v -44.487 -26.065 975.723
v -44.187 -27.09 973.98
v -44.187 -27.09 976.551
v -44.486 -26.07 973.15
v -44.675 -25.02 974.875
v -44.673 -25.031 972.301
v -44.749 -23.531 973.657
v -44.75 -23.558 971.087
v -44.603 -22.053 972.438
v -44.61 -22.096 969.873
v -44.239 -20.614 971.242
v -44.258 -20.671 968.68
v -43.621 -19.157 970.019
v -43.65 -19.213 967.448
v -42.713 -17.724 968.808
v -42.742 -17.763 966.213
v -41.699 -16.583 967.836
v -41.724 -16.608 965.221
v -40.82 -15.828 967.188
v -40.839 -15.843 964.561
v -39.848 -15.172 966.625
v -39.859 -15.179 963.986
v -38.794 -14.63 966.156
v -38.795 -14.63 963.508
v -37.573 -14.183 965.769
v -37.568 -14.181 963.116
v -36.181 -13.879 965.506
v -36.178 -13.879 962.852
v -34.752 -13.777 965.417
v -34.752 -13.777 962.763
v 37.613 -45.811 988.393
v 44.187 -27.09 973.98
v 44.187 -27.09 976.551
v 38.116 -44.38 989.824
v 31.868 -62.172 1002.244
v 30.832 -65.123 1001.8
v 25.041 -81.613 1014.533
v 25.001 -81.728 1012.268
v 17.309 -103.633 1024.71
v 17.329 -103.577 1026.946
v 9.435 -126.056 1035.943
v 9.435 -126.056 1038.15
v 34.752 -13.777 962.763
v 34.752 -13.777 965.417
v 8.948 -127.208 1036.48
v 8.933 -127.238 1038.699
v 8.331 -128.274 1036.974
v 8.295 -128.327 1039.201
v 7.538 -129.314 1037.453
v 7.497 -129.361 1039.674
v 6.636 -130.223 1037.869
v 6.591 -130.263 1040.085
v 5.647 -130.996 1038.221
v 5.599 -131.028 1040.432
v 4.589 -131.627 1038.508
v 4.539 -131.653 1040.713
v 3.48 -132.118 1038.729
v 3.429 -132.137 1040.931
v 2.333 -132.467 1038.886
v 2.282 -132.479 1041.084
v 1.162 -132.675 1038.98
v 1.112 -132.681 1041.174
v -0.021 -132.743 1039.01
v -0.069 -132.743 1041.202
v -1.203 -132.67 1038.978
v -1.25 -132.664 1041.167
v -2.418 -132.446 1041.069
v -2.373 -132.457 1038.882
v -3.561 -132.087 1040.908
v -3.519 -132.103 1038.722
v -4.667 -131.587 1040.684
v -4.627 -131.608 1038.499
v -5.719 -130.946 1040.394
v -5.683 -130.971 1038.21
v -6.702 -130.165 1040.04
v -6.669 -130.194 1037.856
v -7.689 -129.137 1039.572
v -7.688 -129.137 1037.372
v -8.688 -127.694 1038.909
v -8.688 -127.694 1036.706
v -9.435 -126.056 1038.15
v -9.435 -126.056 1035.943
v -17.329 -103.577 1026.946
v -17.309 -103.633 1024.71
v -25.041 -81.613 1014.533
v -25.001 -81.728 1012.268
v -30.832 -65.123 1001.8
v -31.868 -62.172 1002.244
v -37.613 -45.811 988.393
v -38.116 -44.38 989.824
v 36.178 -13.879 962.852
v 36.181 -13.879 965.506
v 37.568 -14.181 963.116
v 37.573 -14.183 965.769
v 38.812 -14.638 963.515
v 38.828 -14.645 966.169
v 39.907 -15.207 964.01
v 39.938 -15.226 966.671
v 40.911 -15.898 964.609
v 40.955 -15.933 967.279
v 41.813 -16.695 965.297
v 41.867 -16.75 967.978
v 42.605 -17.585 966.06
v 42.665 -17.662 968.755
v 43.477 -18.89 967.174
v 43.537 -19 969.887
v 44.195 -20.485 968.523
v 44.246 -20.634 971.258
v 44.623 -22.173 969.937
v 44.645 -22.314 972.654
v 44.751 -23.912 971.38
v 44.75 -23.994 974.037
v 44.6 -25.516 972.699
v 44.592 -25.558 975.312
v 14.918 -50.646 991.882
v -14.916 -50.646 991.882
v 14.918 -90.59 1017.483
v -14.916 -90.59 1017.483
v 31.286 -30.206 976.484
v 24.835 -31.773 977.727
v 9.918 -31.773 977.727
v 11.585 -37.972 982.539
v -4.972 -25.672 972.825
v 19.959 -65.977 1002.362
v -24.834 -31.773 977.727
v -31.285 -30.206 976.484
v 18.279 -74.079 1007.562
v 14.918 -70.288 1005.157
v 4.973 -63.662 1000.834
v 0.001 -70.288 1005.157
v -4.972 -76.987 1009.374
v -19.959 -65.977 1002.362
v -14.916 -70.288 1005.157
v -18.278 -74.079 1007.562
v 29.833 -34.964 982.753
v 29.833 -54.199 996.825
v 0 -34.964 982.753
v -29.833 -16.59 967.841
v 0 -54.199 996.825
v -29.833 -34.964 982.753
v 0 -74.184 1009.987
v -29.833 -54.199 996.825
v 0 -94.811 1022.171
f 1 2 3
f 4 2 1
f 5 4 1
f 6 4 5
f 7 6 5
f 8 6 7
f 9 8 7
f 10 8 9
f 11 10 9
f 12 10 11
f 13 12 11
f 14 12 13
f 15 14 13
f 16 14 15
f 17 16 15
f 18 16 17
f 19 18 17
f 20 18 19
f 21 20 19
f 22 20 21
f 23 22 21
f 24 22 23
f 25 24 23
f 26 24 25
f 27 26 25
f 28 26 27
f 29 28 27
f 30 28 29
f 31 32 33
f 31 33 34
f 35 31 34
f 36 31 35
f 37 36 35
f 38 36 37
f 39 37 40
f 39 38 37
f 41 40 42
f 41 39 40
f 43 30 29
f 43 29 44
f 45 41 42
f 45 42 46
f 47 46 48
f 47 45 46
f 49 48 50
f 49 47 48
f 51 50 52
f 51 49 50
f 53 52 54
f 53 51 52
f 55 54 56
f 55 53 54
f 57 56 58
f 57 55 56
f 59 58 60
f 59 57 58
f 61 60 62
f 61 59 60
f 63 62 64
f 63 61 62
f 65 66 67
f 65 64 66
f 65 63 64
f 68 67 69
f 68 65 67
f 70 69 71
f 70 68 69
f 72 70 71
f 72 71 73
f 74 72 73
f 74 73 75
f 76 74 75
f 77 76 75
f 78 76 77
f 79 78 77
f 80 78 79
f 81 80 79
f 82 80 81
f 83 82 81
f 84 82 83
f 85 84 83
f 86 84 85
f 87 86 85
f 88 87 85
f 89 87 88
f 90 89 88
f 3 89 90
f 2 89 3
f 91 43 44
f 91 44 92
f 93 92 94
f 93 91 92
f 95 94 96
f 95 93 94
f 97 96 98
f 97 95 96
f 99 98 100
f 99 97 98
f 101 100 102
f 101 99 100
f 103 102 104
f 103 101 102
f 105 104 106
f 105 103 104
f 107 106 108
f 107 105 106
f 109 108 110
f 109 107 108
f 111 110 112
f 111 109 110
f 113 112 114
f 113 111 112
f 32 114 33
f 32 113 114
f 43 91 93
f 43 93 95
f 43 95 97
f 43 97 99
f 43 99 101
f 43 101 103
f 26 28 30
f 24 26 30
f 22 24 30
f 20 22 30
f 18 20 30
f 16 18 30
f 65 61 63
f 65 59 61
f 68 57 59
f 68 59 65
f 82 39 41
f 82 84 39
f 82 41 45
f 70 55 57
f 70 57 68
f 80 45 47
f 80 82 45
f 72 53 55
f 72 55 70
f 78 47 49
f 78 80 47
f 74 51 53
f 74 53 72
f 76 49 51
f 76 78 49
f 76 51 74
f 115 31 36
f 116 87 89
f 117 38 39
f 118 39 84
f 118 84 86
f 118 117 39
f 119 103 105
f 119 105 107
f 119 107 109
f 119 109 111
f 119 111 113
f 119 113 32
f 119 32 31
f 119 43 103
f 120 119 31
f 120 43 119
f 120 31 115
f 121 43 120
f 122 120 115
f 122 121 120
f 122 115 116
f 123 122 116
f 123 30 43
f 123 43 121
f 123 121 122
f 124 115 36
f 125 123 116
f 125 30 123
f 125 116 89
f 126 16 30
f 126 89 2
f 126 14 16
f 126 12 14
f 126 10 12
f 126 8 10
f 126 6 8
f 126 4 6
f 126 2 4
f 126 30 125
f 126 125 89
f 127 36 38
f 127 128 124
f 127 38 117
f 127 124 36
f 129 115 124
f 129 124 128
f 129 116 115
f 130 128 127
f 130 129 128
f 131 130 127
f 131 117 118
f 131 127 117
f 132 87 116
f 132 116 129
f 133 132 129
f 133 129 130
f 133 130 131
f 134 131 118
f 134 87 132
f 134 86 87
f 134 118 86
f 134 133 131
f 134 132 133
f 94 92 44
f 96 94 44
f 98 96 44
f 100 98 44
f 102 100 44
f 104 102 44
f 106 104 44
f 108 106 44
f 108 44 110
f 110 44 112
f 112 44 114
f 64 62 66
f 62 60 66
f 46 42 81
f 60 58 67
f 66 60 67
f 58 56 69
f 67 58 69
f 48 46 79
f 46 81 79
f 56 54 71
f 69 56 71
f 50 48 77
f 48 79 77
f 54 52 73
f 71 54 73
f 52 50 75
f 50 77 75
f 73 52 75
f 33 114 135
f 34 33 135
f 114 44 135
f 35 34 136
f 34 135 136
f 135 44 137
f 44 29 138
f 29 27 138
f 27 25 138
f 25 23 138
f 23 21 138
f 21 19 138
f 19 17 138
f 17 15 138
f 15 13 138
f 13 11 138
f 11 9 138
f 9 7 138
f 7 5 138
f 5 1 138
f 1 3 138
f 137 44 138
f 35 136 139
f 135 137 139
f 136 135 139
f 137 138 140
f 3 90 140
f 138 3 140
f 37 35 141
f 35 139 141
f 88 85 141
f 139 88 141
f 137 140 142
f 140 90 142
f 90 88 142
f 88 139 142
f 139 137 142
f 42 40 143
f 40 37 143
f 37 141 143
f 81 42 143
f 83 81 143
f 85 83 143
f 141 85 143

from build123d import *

# Parameters (mm, degrees)
BOSS_EXTRUDE1_DEPTH      = 60
BOSS_EXTRUDE1_DEPTH_BACK = 60
SKETCH2_W                = 211.885293394
SKETCH2_H                = 245.618275427
CUT_EXTRUDE1_DEPTH       = 1077.011666391


with BuildPart() as part:
    # Sketch1 → Boss-Extrude1 (new, two sides: drawn at the far end of the back side and taken through both)
    with BuildSketch(Plane(origin=(0, 0, 0), x_dir=(0, 0, -1), z_dir=(1, 0, 0)).offset(-BOSS_EXTRUDE1_DEPTH_BACK)):
        with BuildLine():
            Line((-939.728923081, 10.577778274), (-941.143184766, 11.992039959))
            add(Edge.make_bspline(
                [(-941.143184766, 11.992039959), (-944.866454136, 8.352727843), (-953.96735323, -0.88168341), (-973.200532651, -22.236280395), (-997.43063536, -53.698126084), (-1022.870084933, -94.455289348), (-1043.814229453, -136.740255628), (-1054.637723921, -165.536150075), (-1059.122238281, -179.688951706)],
                knots=[0.580973428, 0.580973428, 0.580973428, 0.580973428, 0.601711861, 0.63234941, 0.693624509, 0.754899607, 0.816174705, 0.874857615, 0.874857615, 0.874857615, 0.874857615], degree=3))
            Line((-1059.122238281, -179.688951706), (-1057.176612318, -180.169892955))
            add(Edge.make_bspline(
                [(-939.728923081, 10.577778274), (-992.215291969, -40.719110356), (-1034.812797305, -109.667140015), (-1057.176612318, -180.169892955)],
                knots=[0.580942389, 0.580942389, 0.580942389, 0.580942389, 0.874686569, 0.874686569, 0.874686569, 0.874686569], degree=3))
        make_face()
    extrude(amount=BOSS_EXTRUDE1_DEPTH + BOSS_EXTRUDE1_DEPTH_BACK)

    # Sketch2 → Cut-Extrude1 (cut, through all)
    with BuildSketch(Plane.XY):
        with Locations((18.076578956, -88.621698106)):
            Rectangle(SKETCH2_W, SKETCH2_H)
        with BuildLine():
            Line((-0.946549017, -13.77664422), (0.946549017, -13.77664422))
            Line((0.946549017, -13.77664422), (34.752164535, -13.77664422))
            ThreePointArc((34.752164535, -13.77664422), (42.910959356, -17.994424311), (44.187353703, -27.089830806))
            Line((44.187353703, -27.089830806), (9.435189169, -126.055958395))
            ThreePointArc((9.435189169, -126.055958395), (0, -132.742771809), (-9.435189169, -126.055958395))
            Line((-9.435189169, -126.055958395), (-44.187353703, -27.089830806))
            ThreePointArc((-44.187353703, -27.089830806), (-42.910959356, -17.994424311), (-34.752164535, -13.77664422))
            Line((-34.752164535, -13.77664422), (-0.946549017, -13.77664422))
        make_face(mode=Mode.SUBTRACT)
    extrude(amount=CUT_EXTRUDE1_DEPTH, mode=Mode.SUBTRACT)


solid = part.part
